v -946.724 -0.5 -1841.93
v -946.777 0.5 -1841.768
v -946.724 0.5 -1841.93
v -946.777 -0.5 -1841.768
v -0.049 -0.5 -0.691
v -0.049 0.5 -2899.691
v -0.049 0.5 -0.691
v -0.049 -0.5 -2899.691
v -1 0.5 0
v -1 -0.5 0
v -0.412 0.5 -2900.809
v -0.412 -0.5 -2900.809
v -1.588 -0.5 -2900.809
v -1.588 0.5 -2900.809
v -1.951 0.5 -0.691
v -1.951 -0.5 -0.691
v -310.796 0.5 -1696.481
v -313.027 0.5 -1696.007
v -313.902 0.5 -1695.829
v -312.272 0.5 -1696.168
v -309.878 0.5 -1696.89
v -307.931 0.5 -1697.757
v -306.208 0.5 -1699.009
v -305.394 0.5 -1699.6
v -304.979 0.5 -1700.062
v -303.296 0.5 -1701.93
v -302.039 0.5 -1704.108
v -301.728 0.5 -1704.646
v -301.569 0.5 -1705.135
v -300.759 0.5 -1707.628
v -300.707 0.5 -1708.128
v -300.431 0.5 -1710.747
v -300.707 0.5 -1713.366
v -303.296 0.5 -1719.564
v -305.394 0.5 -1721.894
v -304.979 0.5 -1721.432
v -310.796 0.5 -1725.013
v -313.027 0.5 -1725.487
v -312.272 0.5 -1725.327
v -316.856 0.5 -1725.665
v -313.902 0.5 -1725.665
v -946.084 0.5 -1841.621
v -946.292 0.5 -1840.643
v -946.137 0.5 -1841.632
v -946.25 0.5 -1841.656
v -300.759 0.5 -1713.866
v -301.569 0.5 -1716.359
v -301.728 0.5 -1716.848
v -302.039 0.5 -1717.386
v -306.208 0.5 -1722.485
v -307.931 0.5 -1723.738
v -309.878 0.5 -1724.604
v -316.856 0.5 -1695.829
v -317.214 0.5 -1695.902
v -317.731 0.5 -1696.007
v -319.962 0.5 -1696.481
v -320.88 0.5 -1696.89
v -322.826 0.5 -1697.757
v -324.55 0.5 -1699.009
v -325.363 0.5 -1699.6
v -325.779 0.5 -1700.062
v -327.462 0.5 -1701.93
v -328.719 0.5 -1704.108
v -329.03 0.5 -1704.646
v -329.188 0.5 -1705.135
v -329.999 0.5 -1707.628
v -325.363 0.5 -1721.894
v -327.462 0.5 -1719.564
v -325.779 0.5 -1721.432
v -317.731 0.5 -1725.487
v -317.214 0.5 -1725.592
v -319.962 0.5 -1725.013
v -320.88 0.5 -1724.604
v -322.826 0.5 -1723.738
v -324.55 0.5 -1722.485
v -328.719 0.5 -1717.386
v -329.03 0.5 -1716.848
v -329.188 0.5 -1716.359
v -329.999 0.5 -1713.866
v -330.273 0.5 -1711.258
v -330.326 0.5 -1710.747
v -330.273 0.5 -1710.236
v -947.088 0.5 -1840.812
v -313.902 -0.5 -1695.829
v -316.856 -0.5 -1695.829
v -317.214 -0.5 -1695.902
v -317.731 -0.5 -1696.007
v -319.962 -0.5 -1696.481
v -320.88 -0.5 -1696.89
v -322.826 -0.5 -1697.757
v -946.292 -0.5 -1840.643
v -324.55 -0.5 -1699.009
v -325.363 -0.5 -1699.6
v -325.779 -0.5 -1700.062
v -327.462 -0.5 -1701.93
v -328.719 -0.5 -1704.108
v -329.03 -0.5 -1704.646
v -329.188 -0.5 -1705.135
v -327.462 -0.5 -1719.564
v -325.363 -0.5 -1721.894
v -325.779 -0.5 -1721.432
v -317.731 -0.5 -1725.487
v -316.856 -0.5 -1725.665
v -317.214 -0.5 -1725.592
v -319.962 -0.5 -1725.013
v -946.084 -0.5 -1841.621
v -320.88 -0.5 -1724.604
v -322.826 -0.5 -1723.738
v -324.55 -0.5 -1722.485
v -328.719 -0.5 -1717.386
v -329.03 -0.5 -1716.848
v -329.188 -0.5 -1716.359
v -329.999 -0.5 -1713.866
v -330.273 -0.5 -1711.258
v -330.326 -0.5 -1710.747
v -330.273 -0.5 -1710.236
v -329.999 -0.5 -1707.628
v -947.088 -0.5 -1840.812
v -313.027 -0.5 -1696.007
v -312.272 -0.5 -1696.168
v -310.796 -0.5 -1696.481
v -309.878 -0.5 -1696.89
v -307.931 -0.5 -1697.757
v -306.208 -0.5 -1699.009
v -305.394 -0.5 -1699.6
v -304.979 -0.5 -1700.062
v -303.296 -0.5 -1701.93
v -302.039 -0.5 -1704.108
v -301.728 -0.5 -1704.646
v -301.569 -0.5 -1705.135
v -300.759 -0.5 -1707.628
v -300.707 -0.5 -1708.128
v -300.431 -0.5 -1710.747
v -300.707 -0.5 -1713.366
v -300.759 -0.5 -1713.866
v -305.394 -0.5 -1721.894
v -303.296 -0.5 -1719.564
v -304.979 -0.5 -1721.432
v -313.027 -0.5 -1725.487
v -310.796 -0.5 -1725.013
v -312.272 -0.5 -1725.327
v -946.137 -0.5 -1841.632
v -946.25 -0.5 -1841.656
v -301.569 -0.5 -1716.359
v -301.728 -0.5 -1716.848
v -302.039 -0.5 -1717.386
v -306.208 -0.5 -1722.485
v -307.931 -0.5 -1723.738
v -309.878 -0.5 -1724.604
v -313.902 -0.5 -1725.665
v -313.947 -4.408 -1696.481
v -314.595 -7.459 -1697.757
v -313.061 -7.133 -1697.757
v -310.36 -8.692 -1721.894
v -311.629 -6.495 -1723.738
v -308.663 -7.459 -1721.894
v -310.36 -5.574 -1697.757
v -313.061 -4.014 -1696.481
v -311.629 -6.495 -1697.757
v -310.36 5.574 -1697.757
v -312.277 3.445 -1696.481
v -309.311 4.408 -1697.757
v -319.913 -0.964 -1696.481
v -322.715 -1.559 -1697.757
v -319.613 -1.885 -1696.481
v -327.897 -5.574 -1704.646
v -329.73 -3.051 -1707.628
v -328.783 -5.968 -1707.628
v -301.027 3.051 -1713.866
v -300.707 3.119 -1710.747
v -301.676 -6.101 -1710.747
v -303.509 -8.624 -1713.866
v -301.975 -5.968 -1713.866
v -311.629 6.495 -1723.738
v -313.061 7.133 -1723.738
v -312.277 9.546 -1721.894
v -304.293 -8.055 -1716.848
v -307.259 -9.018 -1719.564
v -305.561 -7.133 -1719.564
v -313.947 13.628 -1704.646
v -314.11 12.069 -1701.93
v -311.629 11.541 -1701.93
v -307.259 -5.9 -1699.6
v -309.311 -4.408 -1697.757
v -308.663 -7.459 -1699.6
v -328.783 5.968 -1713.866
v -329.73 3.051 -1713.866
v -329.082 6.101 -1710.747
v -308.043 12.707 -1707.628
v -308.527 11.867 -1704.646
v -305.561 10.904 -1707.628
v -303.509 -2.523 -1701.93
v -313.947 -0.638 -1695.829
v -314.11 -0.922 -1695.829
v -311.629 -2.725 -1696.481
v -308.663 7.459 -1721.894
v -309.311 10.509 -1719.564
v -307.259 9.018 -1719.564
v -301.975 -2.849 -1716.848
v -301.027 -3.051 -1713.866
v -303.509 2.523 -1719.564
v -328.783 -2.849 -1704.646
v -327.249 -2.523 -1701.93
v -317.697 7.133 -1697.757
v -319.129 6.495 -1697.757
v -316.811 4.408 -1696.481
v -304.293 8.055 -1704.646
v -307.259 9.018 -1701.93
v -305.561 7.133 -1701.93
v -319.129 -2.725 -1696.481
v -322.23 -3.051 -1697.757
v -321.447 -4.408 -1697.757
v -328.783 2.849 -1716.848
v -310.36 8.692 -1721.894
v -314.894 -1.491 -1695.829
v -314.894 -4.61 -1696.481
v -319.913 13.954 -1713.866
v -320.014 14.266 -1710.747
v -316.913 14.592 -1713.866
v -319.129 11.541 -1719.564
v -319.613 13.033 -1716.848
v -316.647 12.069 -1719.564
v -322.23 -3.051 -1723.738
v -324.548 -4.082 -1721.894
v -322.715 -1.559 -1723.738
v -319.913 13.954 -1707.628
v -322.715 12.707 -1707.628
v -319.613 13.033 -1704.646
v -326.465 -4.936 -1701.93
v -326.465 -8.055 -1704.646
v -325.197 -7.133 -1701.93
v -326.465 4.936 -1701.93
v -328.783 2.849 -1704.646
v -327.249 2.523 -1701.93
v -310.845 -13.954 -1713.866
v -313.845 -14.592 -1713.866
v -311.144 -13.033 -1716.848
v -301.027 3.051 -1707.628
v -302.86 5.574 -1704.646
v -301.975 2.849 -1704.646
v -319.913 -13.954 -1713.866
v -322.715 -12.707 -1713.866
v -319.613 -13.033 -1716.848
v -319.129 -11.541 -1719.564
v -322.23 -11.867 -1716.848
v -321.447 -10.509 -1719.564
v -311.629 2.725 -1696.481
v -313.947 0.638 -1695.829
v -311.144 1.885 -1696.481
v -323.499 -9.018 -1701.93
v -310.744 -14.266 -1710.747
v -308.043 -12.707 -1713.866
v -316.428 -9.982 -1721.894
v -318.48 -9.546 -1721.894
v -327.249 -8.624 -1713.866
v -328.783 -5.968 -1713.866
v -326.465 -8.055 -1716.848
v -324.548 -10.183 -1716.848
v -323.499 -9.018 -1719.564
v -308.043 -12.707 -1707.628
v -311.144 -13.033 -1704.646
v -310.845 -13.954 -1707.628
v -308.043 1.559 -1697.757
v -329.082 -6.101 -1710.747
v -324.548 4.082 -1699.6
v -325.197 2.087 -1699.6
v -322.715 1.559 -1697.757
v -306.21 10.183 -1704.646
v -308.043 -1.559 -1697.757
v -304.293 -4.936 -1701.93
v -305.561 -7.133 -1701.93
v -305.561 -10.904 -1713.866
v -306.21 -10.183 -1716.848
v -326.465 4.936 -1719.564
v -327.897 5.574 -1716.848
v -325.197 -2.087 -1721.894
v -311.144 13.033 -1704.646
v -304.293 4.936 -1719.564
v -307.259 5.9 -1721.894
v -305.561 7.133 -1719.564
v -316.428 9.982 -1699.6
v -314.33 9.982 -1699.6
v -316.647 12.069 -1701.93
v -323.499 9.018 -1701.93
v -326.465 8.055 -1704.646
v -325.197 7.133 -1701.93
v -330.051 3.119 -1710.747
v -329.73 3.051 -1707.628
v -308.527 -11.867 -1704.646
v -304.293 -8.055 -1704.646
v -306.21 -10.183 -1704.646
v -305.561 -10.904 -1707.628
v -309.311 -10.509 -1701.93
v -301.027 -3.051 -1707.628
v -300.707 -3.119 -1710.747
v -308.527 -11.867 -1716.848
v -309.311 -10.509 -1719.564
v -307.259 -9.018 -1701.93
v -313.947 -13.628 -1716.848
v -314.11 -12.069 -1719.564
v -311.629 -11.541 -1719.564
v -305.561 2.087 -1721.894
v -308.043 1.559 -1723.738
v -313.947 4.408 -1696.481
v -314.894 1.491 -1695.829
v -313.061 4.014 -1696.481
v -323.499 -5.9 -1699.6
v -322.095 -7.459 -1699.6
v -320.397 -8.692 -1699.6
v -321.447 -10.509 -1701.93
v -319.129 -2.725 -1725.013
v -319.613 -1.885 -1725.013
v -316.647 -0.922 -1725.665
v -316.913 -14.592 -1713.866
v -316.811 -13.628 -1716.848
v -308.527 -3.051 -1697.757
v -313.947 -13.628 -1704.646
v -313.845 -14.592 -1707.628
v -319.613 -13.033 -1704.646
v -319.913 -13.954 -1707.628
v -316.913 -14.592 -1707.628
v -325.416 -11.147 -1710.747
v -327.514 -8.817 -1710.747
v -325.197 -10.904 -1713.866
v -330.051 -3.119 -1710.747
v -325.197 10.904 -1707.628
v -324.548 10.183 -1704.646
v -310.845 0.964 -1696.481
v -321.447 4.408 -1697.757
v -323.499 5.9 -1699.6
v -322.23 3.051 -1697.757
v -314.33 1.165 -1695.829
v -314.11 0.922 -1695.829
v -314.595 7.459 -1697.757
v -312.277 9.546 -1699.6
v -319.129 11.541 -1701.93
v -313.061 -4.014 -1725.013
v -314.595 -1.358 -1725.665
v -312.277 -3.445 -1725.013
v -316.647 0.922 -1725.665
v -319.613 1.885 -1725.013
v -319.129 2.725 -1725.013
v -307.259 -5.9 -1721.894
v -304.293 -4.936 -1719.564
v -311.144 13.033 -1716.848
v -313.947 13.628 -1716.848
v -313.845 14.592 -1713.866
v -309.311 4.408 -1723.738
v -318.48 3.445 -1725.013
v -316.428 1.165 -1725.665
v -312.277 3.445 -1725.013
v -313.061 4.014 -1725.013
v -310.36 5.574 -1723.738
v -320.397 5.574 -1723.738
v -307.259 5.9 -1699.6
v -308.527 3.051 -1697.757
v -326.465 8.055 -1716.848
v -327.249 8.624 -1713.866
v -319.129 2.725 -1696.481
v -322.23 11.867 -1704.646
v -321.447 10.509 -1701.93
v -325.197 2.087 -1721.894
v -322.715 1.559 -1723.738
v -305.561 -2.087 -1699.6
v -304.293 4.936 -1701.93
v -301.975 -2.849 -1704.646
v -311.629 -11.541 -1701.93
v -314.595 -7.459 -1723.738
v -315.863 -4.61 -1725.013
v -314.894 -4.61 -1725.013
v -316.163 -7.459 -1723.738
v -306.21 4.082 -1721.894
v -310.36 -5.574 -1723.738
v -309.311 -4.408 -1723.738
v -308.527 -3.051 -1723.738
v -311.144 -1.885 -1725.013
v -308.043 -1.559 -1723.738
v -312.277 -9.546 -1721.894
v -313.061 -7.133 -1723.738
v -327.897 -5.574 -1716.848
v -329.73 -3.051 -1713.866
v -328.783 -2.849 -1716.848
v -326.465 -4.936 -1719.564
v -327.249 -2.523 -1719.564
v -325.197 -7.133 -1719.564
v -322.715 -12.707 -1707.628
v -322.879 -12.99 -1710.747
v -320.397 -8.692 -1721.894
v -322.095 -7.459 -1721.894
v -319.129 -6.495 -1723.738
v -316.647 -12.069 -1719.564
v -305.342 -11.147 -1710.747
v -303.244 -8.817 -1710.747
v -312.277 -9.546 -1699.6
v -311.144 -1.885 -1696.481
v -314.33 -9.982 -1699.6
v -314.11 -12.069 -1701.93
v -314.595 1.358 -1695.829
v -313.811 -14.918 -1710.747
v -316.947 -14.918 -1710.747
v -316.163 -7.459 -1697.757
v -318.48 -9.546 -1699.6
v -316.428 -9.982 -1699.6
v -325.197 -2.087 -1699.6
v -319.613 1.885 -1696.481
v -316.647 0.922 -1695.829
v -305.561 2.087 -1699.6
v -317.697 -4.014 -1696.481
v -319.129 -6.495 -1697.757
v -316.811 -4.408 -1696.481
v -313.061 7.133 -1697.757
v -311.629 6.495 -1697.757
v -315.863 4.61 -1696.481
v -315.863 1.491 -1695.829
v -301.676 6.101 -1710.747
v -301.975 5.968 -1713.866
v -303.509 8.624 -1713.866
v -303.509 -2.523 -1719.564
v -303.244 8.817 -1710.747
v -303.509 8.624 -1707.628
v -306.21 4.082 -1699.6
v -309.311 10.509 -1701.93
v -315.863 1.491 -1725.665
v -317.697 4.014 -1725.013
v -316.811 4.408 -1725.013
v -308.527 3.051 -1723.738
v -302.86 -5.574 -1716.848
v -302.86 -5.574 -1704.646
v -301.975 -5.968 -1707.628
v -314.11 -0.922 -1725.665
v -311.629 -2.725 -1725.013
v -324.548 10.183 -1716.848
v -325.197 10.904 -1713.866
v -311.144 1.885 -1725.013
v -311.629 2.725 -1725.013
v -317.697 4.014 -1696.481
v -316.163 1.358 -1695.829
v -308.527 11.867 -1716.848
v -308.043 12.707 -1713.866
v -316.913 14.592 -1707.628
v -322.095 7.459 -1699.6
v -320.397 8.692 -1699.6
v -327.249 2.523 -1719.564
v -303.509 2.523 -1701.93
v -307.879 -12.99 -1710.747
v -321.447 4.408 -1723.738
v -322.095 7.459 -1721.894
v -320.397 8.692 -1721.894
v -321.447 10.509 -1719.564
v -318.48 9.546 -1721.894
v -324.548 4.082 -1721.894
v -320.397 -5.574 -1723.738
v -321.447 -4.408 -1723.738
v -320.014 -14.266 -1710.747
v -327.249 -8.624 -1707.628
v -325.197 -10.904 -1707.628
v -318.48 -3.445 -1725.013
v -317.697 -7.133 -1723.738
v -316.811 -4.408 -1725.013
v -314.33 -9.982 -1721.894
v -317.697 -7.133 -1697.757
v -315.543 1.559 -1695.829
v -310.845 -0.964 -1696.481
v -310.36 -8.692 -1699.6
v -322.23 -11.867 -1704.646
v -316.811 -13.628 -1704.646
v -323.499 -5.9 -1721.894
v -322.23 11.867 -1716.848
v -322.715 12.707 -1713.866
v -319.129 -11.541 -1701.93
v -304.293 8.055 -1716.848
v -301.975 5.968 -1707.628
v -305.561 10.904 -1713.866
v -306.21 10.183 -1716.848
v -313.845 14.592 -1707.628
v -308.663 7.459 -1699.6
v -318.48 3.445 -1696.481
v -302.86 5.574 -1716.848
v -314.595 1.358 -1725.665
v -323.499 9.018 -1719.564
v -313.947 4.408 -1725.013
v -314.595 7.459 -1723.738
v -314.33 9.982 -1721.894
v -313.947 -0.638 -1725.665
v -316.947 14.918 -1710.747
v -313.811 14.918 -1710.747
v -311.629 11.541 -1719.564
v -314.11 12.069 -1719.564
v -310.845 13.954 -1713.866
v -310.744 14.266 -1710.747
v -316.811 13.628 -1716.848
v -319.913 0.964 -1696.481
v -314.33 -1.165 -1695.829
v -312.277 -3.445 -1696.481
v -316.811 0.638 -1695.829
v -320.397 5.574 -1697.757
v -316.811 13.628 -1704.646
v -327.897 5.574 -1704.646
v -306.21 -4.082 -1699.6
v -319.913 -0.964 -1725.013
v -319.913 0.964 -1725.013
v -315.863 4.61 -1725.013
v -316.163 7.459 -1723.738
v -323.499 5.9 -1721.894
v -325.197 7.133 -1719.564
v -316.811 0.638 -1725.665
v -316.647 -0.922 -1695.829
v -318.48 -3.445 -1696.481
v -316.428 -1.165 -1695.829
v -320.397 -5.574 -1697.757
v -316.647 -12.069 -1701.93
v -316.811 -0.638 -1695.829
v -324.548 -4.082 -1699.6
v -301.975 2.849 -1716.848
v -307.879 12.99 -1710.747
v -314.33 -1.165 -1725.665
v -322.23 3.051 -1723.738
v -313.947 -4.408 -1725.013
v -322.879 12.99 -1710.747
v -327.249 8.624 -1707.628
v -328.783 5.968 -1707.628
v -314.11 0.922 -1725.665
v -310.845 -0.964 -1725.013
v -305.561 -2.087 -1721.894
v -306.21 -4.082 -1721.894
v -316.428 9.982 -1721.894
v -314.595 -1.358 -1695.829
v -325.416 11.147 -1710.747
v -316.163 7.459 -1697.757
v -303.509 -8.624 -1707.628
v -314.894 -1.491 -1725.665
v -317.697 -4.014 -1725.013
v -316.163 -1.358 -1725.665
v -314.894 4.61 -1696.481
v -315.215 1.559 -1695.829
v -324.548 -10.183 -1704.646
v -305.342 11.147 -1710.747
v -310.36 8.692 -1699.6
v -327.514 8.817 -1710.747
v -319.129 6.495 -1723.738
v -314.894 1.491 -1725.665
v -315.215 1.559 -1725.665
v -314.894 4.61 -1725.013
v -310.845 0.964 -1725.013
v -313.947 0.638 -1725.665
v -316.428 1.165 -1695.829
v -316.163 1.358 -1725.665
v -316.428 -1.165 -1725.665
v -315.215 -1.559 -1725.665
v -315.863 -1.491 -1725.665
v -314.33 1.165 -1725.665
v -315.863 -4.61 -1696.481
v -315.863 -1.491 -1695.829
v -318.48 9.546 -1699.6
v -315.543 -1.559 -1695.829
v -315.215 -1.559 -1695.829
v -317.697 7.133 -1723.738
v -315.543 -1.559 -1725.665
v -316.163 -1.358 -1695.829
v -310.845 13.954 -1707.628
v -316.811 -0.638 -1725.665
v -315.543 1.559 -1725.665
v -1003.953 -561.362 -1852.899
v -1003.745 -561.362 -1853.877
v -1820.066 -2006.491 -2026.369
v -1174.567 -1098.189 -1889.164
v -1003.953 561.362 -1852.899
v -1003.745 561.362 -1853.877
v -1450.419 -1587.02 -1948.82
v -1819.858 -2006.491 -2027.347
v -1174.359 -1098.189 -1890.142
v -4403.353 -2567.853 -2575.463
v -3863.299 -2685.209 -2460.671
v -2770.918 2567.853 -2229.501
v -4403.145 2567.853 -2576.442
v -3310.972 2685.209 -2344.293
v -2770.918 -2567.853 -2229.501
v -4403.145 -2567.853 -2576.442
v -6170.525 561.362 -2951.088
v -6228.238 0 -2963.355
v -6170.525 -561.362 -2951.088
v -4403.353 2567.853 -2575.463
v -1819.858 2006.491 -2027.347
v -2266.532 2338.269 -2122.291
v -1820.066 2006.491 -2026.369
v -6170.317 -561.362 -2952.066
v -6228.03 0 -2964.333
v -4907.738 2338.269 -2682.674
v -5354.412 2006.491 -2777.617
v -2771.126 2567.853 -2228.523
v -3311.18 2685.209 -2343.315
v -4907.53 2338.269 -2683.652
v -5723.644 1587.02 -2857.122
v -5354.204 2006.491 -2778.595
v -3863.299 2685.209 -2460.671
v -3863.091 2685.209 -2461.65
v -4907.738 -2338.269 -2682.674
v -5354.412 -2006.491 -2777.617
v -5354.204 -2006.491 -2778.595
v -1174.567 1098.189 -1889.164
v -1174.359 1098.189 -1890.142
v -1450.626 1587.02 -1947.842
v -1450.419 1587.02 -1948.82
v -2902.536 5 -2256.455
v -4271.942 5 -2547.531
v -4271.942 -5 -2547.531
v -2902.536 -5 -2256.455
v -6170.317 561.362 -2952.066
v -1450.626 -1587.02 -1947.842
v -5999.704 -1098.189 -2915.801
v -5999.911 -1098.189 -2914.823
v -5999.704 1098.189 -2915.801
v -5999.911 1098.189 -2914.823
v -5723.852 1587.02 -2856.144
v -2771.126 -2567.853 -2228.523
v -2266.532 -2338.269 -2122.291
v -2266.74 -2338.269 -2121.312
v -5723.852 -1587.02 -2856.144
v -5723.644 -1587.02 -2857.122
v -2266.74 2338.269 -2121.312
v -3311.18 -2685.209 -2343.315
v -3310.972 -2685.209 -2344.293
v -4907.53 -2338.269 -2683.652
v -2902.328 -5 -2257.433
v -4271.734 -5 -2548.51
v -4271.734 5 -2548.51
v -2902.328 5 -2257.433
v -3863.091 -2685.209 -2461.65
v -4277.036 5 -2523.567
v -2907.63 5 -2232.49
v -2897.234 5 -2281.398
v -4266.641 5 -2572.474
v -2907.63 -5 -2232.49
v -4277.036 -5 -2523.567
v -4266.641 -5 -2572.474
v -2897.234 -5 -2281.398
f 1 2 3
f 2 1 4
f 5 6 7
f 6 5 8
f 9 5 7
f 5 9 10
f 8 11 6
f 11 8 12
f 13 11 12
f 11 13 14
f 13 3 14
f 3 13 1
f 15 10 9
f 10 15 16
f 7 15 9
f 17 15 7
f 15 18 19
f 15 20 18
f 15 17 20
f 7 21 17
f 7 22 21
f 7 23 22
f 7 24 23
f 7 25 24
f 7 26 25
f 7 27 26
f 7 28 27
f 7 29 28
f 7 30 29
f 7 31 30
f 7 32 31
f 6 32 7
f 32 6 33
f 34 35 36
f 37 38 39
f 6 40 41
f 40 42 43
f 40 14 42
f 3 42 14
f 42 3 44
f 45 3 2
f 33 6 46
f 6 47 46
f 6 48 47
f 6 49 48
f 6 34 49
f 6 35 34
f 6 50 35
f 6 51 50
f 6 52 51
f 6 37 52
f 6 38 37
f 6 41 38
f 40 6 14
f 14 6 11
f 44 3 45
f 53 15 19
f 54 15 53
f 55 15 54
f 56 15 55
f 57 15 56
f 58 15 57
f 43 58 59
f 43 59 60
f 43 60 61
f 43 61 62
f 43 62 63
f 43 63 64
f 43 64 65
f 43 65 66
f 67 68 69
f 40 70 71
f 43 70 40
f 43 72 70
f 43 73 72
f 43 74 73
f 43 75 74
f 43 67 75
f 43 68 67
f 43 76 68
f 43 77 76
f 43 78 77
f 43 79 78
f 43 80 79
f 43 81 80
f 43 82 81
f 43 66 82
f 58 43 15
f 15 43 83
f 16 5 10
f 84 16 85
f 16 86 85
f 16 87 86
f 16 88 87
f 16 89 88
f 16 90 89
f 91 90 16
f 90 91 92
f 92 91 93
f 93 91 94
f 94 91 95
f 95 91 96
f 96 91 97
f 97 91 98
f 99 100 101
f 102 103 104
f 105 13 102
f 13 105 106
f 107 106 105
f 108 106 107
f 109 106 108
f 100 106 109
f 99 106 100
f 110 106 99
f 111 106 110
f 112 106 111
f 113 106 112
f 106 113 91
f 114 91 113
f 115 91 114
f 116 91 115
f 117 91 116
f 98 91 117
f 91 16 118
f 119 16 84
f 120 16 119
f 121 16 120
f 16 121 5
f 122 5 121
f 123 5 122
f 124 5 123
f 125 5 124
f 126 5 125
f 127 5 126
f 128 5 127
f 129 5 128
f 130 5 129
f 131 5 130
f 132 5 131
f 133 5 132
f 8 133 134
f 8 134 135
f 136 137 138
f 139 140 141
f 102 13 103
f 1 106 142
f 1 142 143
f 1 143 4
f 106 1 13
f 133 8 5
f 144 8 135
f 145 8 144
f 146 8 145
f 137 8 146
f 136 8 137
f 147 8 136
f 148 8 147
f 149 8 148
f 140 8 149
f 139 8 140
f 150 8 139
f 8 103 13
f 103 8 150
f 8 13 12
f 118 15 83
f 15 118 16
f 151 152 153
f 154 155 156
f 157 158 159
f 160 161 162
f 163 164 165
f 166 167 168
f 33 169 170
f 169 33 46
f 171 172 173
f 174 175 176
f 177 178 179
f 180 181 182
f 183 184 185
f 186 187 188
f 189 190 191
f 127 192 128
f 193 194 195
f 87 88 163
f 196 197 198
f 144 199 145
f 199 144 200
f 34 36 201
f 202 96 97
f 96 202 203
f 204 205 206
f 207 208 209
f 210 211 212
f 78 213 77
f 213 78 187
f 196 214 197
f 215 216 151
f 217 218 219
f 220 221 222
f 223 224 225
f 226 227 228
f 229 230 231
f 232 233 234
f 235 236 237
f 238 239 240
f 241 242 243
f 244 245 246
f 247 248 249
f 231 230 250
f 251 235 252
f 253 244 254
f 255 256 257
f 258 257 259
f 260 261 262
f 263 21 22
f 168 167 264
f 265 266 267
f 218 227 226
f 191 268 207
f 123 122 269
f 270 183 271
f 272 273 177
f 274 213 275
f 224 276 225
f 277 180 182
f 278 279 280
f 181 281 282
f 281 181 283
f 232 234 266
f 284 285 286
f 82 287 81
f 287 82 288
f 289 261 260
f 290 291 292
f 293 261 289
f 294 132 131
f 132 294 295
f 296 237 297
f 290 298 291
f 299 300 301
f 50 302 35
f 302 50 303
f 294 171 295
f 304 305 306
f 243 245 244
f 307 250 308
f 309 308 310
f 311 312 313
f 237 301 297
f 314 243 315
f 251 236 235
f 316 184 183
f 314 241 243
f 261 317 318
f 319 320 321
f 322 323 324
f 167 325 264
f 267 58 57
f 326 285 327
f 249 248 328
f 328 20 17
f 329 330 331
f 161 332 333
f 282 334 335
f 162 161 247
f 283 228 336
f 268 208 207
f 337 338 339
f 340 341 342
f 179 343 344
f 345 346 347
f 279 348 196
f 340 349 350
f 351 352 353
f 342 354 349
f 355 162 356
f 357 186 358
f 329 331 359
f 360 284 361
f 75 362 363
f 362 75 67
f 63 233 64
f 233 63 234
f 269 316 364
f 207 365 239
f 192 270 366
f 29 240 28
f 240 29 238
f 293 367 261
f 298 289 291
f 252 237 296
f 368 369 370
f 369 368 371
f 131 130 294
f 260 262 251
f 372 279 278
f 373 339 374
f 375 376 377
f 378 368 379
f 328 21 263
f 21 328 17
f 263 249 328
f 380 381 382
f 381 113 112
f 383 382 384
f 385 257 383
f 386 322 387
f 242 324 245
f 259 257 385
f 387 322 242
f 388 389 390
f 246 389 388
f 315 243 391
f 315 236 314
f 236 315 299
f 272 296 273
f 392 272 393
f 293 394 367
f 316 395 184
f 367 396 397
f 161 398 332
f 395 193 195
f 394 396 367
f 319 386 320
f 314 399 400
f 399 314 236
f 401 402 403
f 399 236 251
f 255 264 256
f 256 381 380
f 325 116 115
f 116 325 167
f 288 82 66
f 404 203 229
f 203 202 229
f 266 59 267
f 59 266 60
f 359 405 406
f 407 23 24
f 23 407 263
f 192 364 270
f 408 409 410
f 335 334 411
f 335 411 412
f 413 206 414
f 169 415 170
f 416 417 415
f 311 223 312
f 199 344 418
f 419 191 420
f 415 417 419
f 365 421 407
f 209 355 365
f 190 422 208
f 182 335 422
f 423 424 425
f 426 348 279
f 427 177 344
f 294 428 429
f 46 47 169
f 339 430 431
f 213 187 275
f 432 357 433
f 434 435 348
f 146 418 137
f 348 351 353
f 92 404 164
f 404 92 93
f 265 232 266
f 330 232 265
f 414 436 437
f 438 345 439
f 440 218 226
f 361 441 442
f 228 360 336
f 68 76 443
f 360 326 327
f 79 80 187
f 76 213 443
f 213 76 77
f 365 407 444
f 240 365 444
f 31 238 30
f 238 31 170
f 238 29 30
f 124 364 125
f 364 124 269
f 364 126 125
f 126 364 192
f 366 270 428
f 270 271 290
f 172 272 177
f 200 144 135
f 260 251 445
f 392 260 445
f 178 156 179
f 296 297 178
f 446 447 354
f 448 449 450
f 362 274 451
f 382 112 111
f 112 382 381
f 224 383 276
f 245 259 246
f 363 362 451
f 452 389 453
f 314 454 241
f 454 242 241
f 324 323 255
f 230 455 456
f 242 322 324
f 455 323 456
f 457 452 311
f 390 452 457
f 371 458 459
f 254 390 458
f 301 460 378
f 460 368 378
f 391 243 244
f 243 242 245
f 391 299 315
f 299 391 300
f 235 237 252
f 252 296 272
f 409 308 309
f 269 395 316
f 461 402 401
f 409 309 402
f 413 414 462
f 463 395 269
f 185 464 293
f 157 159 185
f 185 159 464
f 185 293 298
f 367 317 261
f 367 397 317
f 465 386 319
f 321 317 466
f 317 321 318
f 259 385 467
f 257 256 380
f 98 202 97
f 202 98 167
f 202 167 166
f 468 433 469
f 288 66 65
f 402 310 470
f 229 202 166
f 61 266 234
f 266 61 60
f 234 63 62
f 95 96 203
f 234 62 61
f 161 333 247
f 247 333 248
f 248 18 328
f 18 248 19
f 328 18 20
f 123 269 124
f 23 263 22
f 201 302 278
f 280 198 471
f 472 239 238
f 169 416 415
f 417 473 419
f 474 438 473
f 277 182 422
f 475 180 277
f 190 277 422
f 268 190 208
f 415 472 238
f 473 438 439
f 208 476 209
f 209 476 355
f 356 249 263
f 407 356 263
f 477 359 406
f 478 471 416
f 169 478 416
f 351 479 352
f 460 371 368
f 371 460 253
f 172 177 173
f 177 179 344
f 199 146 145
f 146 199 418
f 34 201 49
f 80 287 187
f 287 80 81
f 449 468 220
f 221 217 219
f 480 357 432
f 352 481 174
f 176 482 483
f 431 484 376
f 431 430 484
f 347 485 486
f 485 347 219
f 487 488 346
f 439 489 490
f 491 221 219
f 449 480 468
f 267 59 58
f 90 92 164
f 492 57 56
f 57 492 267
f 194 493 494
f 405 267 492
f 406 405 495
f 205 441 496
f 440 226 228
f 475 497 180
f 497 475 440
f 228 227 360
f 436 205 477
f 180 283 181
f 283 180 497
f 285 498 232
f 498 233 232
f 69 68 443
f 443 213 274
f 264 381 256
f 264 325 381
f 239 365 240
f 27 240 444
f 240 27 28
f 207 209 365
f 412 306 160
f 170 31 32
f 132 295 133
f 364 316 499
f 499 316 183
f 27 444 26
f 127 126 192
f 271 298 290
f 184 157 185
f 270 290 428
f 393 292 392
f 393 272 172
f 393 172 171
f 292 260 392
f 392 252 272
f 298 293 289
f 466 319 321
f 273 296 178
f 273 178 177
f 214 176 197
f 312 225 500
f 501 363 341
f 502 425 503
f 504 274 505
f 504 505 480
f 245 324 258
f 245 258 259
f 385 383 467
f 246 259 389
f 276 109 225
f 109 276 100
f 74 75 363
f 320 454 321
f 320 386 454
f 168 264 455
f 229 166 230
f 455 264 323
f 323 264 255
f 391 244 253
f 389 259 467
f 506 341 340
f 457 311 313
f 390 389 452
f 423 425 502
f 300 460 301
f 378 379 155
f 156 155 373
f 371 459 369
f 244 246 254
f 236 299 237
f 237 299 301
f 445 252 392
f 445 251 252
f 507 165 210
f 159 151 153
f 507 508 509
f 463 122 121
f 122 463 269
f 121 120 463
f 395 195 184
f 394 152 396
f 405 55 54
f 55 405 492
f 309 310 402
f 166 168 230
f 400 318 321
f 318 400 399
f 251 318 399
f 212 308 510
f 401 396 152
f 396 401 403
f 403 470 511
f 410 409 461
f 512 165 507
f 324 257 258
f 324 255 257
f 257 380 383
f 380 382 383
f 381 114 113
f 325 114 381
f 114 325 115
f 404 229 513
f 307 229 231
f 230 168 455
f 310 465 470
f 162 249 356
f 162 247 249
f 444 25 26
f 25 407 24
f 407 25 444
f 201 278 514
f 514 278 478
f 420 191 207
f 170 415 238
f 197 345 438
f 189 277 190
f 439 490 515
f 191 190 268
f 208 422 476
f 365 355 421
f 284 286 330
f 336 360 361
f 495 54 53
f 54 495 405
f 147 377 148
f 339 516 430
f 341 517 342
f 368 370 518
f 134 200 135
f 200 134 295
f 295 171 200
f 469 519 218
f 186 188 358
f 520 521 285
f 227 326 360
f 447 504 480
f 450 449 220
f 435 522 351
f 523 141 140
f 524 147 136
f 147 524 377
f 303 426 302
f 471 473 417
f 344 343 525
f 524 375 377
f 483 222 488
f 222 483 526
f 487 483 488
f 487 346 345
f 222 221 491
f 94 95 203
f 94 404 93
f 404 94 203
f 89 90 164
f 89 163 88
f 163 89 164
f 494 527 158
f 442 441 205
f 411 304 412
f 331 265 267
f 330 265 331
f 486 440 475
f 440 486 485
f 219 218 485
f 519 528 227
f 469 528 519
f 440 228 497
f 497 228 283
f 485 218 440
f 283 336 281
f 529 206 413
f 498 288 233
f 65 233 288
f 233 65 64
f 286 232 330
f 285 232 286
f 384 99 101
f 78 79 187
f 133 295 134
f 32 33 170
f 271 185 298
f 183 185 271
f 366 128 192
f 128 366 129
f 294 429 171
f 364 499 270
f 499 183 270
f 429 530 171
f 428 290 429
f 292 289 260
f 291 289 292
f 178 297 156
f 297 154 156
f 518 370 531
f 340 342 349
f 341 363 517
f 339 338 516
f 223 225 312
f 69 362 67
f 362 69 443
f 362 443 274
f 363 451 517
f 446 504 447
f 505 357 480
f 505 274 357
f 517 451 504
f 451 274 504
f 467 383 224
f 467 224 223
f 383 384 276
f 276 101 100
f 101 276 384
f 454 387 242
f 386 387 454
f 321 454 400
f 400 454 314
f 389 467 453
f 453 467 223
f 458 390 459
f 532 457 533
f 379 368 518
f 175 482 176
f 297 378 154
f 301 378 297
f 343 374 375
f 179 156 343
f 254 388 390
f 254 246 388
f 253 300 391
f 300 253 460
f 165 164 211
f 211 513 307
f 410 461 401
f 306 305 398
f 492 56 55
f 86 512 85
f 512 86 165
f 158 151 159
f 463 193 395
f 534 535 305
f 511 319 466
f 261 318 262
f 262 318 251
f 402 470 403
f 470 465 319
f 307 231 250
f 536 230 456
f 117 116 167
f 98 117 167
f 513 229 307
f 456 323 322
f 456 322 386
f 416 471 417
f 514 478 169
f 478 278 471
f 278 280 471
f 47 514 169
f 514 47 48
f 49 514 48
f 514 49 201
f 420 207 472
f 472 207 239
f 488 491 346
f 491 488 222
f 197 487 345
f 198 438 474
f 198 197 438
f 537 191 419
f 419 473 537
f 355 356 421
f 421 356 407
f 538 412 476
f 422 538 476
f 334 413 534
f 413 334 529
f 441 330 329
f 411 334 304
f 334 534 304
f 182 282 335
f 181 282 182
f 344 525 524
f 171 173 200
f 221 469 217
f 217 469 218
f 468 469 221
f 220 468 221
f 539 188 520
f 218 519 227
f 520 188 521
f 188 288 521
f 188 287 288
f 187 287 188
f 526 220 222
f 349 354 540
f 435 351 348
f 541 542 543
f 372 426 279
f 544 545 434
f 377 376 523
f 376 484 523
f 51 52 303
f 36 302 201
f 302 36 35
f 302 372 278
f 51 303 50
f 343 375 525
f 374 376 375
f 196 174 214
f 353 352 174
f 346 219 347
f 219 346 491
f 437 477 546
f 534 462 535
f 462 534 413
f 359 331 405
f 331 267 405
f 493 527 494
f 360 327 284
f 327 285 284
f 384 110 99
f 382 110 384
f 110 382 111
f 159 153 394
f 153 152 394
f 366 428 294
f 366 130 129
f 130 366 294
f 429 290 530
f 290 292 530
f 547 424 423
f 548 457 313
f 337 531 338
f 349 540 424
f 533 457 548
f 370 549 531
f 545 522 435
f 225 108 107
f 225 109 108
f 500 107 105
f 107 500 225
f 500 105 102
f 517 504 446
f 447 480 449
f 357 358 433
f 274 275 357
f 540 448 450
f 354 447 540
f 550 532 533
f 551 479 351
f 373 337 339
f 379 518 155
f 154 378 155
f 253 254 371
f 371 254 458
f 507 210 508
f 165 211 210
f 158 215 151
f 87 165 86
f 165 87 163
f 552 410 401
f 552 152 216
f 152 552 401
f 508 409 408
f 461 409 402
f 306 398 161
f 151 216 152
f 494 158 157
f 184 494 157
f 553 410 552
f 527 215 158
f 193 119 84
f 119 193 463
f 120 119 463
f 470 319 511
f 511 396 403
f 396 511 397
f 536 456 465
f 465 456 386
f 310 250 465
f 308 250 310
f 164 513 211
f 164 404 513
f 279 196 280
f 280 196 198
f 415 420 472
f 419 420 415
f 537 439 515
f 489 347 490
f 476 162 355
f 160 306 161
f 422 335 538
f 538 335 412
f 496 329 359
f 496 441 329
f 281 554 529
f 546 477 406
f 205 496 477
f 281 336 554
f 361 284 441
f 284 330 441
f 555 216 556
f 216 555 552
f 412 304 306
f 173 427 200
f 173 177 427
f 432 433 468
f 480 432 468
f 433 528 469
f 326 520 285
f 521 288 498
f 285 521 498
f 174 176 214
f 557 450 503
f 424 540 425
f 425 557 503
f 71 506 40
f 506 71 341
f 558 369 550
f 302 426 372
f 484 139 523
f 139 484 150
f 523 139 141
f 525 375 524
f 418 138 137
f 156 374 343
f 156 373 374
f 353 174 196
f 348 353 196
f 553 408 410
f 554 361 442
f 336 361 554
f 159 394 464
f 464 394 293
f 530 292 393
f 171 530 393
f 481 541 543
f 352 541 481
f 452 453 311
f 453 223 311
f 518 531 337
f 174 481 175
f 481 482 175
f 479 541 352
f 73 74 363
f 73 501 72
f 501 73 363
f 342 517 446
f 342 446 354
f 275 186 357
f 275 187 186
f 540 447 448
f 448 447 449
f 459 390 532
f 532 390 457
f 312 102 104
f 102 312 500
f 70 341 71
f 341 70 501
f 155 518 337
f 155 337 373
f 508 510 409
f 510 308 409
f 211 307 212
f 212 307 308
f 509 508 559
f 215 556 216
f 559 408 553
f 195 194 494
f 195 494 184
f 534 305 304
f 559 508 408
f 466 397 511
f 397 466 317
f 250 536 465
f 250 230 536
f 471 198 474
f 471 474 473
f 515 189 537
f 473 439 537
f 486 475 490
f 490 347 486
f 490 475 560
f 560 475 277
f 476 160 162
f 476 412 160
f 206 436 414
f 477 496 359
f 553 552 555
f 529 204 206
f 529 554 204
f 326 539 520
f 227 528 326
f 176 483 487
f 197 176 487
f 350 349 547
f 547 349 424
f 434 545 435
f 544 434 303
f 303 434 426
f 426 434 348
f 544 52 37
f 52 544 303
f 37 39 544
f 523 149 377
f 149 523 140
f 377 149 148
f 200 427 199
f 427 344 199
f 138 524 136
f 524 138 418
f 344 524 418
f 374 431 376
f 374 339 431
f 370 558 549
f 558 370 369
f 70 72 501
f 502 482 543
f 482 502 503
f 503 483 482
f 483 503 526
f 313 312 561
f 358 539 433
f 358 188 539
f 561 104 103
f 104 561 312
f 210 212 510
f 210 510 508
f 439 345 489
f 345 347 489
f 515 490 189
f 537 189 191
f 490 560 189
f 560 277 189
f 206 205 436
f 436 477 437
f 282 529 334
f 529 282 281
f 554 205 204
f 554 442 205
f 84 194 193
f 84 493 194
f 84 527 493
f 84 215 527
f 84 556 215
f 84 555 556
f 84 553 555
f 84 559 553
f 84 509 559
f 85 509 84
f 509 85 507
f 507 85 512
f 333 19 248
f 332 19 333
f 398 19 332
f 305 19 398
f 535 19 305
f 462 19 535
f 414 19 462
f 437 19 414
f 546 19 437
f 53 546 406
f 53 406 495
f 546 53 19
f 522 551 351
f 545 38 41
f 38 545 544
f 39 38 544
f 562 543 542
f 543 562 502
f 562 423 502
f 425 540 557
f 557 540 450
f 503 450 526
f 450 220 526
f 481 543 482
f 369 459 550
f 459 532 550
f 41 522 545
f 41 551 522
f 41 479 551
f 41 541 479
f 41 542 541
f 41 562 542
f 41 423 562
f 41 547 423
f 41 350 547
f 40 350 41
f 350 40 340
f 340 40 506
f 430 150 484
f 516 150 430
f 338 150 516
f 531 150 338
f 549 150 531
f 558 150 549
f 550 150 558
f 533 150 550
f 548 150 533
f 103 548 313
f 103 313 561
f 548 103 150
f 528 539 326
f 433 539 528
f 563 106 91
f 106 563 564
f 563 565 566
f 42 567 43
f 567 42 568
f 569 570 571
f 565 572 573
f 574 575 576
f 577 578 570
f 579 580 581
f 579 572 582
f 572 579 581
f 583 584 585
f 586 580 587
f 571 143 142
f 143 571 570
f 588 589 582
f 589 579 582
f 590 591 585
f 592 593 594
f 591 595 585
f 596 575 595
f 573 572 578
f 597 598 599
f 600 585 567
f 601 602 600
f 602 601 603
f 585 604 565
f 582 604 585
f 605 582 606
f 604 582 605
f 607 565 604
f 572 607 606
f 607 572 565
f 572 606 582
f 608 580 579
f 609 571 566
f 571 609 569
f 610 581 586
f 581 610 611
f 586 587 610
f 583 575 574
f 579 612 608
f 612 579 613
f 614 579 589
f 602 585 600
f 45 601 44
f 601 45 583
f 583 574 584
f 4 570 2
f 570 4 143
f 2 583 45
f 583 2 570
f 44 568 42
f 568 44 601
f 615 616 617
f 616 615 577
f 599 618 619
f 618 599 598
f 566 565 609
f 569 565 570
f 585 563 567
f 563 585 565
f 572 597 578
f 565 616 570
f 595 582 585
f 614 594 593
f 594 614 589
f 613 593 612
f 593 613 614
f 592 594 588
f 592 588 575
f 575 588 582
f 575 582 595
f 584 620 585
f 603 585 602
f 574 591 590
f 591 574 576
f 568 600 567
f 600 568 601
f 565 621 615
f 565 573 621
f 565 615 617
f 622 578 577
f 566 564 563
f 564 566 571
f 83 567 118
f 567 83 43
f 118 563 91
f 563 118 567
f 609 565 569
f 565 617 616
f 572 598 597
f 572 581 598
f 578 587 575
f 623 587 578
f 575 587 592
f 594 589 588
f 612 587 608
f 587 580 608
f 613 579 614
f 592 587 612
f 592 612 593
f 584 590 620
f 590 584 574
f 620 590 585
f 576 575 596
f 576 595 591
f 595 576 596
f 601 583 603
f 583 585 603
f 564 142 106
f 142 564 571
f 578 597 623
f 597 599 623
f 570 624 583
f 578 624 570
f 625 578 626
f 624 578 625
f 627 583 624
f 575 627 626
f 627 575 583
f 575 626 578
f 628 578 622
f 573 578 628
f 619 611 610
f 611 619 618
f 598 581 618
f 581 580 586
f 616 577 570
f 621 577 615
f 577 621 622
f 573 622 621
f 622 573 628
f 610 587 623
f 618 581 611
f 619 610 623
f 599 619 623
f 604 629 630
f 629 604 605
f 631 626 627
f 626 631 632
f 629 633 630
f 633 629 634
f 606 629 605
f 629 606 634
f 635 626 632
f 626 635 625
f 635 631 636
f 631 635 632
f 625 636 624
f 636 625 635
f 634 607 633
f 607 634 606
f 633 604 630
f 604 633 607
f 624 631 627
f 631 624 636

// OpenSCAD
StakselStorm();

module StakselStorm (){

  r1 = 1;
  wid = 1;

  sideA = 2900;
  sideB = 2070;
  sideC = 1420;

  p = (sideA + sideB + sideC)/2;

  sq = sqrt(p*(p-sideA)*(p-sideB)*(p-sideC));

  sideA_h = 2 * sq / sideA;

  sideB_A = sqrt(sideB*sideB - sideA_h*sideA_h);

  ct_hor = sideA_h * 1 / 3;

  ct_vert =  sideB_A - (sideB_A - sideA/2) * 1/3 ;

  //echo ("sideB_A: ", sideB_A);

//    translate([ 0 , 0 , sideA ]) {

      rotate([ 0 , -90 , 0 ])
      hull()  { 
  
          translate([ - 1 , 0 , 1 ]) 
          rotate([ 90 , 0 , 0 ])
          cylinder( r = r1 , h = wid , center = true );
  
          translate([  - sideA , 0 , 1 ]) 
          rotate([ 90 , 0 , 0 ])
          cylinder( r = r1 , h = wid , center = true );
  
          translate([ -  sideB_A , 0 , sideA_h ]) 
          rotate([ 90 , 0 , 0 ])
          cylinder( r = r1 , h = wid , center = true );
  
      }
  
      translate([ -ct_hor , 0 , -ct_vert ])
      sphere(d = 30);
      

      cylRad = 2700;
  
      translate([ -sideA_h, 0 , -sideB_A ])
      rotate([ 0 , -12 , 0 ])
      translate([ -cylRad , 0 , 0 ])
      cylinder( r = cylRad , h = 1 , center=true );
      
      translate([ -sideA_h, 0 , -sideB_A ])
      rotate([ 0 , -12 , 0 ])
      translate([ -cylRad , 0 , 0 ])
      cube([ 1400 , 10 , 50 ] , center=true );



 //   }



}
